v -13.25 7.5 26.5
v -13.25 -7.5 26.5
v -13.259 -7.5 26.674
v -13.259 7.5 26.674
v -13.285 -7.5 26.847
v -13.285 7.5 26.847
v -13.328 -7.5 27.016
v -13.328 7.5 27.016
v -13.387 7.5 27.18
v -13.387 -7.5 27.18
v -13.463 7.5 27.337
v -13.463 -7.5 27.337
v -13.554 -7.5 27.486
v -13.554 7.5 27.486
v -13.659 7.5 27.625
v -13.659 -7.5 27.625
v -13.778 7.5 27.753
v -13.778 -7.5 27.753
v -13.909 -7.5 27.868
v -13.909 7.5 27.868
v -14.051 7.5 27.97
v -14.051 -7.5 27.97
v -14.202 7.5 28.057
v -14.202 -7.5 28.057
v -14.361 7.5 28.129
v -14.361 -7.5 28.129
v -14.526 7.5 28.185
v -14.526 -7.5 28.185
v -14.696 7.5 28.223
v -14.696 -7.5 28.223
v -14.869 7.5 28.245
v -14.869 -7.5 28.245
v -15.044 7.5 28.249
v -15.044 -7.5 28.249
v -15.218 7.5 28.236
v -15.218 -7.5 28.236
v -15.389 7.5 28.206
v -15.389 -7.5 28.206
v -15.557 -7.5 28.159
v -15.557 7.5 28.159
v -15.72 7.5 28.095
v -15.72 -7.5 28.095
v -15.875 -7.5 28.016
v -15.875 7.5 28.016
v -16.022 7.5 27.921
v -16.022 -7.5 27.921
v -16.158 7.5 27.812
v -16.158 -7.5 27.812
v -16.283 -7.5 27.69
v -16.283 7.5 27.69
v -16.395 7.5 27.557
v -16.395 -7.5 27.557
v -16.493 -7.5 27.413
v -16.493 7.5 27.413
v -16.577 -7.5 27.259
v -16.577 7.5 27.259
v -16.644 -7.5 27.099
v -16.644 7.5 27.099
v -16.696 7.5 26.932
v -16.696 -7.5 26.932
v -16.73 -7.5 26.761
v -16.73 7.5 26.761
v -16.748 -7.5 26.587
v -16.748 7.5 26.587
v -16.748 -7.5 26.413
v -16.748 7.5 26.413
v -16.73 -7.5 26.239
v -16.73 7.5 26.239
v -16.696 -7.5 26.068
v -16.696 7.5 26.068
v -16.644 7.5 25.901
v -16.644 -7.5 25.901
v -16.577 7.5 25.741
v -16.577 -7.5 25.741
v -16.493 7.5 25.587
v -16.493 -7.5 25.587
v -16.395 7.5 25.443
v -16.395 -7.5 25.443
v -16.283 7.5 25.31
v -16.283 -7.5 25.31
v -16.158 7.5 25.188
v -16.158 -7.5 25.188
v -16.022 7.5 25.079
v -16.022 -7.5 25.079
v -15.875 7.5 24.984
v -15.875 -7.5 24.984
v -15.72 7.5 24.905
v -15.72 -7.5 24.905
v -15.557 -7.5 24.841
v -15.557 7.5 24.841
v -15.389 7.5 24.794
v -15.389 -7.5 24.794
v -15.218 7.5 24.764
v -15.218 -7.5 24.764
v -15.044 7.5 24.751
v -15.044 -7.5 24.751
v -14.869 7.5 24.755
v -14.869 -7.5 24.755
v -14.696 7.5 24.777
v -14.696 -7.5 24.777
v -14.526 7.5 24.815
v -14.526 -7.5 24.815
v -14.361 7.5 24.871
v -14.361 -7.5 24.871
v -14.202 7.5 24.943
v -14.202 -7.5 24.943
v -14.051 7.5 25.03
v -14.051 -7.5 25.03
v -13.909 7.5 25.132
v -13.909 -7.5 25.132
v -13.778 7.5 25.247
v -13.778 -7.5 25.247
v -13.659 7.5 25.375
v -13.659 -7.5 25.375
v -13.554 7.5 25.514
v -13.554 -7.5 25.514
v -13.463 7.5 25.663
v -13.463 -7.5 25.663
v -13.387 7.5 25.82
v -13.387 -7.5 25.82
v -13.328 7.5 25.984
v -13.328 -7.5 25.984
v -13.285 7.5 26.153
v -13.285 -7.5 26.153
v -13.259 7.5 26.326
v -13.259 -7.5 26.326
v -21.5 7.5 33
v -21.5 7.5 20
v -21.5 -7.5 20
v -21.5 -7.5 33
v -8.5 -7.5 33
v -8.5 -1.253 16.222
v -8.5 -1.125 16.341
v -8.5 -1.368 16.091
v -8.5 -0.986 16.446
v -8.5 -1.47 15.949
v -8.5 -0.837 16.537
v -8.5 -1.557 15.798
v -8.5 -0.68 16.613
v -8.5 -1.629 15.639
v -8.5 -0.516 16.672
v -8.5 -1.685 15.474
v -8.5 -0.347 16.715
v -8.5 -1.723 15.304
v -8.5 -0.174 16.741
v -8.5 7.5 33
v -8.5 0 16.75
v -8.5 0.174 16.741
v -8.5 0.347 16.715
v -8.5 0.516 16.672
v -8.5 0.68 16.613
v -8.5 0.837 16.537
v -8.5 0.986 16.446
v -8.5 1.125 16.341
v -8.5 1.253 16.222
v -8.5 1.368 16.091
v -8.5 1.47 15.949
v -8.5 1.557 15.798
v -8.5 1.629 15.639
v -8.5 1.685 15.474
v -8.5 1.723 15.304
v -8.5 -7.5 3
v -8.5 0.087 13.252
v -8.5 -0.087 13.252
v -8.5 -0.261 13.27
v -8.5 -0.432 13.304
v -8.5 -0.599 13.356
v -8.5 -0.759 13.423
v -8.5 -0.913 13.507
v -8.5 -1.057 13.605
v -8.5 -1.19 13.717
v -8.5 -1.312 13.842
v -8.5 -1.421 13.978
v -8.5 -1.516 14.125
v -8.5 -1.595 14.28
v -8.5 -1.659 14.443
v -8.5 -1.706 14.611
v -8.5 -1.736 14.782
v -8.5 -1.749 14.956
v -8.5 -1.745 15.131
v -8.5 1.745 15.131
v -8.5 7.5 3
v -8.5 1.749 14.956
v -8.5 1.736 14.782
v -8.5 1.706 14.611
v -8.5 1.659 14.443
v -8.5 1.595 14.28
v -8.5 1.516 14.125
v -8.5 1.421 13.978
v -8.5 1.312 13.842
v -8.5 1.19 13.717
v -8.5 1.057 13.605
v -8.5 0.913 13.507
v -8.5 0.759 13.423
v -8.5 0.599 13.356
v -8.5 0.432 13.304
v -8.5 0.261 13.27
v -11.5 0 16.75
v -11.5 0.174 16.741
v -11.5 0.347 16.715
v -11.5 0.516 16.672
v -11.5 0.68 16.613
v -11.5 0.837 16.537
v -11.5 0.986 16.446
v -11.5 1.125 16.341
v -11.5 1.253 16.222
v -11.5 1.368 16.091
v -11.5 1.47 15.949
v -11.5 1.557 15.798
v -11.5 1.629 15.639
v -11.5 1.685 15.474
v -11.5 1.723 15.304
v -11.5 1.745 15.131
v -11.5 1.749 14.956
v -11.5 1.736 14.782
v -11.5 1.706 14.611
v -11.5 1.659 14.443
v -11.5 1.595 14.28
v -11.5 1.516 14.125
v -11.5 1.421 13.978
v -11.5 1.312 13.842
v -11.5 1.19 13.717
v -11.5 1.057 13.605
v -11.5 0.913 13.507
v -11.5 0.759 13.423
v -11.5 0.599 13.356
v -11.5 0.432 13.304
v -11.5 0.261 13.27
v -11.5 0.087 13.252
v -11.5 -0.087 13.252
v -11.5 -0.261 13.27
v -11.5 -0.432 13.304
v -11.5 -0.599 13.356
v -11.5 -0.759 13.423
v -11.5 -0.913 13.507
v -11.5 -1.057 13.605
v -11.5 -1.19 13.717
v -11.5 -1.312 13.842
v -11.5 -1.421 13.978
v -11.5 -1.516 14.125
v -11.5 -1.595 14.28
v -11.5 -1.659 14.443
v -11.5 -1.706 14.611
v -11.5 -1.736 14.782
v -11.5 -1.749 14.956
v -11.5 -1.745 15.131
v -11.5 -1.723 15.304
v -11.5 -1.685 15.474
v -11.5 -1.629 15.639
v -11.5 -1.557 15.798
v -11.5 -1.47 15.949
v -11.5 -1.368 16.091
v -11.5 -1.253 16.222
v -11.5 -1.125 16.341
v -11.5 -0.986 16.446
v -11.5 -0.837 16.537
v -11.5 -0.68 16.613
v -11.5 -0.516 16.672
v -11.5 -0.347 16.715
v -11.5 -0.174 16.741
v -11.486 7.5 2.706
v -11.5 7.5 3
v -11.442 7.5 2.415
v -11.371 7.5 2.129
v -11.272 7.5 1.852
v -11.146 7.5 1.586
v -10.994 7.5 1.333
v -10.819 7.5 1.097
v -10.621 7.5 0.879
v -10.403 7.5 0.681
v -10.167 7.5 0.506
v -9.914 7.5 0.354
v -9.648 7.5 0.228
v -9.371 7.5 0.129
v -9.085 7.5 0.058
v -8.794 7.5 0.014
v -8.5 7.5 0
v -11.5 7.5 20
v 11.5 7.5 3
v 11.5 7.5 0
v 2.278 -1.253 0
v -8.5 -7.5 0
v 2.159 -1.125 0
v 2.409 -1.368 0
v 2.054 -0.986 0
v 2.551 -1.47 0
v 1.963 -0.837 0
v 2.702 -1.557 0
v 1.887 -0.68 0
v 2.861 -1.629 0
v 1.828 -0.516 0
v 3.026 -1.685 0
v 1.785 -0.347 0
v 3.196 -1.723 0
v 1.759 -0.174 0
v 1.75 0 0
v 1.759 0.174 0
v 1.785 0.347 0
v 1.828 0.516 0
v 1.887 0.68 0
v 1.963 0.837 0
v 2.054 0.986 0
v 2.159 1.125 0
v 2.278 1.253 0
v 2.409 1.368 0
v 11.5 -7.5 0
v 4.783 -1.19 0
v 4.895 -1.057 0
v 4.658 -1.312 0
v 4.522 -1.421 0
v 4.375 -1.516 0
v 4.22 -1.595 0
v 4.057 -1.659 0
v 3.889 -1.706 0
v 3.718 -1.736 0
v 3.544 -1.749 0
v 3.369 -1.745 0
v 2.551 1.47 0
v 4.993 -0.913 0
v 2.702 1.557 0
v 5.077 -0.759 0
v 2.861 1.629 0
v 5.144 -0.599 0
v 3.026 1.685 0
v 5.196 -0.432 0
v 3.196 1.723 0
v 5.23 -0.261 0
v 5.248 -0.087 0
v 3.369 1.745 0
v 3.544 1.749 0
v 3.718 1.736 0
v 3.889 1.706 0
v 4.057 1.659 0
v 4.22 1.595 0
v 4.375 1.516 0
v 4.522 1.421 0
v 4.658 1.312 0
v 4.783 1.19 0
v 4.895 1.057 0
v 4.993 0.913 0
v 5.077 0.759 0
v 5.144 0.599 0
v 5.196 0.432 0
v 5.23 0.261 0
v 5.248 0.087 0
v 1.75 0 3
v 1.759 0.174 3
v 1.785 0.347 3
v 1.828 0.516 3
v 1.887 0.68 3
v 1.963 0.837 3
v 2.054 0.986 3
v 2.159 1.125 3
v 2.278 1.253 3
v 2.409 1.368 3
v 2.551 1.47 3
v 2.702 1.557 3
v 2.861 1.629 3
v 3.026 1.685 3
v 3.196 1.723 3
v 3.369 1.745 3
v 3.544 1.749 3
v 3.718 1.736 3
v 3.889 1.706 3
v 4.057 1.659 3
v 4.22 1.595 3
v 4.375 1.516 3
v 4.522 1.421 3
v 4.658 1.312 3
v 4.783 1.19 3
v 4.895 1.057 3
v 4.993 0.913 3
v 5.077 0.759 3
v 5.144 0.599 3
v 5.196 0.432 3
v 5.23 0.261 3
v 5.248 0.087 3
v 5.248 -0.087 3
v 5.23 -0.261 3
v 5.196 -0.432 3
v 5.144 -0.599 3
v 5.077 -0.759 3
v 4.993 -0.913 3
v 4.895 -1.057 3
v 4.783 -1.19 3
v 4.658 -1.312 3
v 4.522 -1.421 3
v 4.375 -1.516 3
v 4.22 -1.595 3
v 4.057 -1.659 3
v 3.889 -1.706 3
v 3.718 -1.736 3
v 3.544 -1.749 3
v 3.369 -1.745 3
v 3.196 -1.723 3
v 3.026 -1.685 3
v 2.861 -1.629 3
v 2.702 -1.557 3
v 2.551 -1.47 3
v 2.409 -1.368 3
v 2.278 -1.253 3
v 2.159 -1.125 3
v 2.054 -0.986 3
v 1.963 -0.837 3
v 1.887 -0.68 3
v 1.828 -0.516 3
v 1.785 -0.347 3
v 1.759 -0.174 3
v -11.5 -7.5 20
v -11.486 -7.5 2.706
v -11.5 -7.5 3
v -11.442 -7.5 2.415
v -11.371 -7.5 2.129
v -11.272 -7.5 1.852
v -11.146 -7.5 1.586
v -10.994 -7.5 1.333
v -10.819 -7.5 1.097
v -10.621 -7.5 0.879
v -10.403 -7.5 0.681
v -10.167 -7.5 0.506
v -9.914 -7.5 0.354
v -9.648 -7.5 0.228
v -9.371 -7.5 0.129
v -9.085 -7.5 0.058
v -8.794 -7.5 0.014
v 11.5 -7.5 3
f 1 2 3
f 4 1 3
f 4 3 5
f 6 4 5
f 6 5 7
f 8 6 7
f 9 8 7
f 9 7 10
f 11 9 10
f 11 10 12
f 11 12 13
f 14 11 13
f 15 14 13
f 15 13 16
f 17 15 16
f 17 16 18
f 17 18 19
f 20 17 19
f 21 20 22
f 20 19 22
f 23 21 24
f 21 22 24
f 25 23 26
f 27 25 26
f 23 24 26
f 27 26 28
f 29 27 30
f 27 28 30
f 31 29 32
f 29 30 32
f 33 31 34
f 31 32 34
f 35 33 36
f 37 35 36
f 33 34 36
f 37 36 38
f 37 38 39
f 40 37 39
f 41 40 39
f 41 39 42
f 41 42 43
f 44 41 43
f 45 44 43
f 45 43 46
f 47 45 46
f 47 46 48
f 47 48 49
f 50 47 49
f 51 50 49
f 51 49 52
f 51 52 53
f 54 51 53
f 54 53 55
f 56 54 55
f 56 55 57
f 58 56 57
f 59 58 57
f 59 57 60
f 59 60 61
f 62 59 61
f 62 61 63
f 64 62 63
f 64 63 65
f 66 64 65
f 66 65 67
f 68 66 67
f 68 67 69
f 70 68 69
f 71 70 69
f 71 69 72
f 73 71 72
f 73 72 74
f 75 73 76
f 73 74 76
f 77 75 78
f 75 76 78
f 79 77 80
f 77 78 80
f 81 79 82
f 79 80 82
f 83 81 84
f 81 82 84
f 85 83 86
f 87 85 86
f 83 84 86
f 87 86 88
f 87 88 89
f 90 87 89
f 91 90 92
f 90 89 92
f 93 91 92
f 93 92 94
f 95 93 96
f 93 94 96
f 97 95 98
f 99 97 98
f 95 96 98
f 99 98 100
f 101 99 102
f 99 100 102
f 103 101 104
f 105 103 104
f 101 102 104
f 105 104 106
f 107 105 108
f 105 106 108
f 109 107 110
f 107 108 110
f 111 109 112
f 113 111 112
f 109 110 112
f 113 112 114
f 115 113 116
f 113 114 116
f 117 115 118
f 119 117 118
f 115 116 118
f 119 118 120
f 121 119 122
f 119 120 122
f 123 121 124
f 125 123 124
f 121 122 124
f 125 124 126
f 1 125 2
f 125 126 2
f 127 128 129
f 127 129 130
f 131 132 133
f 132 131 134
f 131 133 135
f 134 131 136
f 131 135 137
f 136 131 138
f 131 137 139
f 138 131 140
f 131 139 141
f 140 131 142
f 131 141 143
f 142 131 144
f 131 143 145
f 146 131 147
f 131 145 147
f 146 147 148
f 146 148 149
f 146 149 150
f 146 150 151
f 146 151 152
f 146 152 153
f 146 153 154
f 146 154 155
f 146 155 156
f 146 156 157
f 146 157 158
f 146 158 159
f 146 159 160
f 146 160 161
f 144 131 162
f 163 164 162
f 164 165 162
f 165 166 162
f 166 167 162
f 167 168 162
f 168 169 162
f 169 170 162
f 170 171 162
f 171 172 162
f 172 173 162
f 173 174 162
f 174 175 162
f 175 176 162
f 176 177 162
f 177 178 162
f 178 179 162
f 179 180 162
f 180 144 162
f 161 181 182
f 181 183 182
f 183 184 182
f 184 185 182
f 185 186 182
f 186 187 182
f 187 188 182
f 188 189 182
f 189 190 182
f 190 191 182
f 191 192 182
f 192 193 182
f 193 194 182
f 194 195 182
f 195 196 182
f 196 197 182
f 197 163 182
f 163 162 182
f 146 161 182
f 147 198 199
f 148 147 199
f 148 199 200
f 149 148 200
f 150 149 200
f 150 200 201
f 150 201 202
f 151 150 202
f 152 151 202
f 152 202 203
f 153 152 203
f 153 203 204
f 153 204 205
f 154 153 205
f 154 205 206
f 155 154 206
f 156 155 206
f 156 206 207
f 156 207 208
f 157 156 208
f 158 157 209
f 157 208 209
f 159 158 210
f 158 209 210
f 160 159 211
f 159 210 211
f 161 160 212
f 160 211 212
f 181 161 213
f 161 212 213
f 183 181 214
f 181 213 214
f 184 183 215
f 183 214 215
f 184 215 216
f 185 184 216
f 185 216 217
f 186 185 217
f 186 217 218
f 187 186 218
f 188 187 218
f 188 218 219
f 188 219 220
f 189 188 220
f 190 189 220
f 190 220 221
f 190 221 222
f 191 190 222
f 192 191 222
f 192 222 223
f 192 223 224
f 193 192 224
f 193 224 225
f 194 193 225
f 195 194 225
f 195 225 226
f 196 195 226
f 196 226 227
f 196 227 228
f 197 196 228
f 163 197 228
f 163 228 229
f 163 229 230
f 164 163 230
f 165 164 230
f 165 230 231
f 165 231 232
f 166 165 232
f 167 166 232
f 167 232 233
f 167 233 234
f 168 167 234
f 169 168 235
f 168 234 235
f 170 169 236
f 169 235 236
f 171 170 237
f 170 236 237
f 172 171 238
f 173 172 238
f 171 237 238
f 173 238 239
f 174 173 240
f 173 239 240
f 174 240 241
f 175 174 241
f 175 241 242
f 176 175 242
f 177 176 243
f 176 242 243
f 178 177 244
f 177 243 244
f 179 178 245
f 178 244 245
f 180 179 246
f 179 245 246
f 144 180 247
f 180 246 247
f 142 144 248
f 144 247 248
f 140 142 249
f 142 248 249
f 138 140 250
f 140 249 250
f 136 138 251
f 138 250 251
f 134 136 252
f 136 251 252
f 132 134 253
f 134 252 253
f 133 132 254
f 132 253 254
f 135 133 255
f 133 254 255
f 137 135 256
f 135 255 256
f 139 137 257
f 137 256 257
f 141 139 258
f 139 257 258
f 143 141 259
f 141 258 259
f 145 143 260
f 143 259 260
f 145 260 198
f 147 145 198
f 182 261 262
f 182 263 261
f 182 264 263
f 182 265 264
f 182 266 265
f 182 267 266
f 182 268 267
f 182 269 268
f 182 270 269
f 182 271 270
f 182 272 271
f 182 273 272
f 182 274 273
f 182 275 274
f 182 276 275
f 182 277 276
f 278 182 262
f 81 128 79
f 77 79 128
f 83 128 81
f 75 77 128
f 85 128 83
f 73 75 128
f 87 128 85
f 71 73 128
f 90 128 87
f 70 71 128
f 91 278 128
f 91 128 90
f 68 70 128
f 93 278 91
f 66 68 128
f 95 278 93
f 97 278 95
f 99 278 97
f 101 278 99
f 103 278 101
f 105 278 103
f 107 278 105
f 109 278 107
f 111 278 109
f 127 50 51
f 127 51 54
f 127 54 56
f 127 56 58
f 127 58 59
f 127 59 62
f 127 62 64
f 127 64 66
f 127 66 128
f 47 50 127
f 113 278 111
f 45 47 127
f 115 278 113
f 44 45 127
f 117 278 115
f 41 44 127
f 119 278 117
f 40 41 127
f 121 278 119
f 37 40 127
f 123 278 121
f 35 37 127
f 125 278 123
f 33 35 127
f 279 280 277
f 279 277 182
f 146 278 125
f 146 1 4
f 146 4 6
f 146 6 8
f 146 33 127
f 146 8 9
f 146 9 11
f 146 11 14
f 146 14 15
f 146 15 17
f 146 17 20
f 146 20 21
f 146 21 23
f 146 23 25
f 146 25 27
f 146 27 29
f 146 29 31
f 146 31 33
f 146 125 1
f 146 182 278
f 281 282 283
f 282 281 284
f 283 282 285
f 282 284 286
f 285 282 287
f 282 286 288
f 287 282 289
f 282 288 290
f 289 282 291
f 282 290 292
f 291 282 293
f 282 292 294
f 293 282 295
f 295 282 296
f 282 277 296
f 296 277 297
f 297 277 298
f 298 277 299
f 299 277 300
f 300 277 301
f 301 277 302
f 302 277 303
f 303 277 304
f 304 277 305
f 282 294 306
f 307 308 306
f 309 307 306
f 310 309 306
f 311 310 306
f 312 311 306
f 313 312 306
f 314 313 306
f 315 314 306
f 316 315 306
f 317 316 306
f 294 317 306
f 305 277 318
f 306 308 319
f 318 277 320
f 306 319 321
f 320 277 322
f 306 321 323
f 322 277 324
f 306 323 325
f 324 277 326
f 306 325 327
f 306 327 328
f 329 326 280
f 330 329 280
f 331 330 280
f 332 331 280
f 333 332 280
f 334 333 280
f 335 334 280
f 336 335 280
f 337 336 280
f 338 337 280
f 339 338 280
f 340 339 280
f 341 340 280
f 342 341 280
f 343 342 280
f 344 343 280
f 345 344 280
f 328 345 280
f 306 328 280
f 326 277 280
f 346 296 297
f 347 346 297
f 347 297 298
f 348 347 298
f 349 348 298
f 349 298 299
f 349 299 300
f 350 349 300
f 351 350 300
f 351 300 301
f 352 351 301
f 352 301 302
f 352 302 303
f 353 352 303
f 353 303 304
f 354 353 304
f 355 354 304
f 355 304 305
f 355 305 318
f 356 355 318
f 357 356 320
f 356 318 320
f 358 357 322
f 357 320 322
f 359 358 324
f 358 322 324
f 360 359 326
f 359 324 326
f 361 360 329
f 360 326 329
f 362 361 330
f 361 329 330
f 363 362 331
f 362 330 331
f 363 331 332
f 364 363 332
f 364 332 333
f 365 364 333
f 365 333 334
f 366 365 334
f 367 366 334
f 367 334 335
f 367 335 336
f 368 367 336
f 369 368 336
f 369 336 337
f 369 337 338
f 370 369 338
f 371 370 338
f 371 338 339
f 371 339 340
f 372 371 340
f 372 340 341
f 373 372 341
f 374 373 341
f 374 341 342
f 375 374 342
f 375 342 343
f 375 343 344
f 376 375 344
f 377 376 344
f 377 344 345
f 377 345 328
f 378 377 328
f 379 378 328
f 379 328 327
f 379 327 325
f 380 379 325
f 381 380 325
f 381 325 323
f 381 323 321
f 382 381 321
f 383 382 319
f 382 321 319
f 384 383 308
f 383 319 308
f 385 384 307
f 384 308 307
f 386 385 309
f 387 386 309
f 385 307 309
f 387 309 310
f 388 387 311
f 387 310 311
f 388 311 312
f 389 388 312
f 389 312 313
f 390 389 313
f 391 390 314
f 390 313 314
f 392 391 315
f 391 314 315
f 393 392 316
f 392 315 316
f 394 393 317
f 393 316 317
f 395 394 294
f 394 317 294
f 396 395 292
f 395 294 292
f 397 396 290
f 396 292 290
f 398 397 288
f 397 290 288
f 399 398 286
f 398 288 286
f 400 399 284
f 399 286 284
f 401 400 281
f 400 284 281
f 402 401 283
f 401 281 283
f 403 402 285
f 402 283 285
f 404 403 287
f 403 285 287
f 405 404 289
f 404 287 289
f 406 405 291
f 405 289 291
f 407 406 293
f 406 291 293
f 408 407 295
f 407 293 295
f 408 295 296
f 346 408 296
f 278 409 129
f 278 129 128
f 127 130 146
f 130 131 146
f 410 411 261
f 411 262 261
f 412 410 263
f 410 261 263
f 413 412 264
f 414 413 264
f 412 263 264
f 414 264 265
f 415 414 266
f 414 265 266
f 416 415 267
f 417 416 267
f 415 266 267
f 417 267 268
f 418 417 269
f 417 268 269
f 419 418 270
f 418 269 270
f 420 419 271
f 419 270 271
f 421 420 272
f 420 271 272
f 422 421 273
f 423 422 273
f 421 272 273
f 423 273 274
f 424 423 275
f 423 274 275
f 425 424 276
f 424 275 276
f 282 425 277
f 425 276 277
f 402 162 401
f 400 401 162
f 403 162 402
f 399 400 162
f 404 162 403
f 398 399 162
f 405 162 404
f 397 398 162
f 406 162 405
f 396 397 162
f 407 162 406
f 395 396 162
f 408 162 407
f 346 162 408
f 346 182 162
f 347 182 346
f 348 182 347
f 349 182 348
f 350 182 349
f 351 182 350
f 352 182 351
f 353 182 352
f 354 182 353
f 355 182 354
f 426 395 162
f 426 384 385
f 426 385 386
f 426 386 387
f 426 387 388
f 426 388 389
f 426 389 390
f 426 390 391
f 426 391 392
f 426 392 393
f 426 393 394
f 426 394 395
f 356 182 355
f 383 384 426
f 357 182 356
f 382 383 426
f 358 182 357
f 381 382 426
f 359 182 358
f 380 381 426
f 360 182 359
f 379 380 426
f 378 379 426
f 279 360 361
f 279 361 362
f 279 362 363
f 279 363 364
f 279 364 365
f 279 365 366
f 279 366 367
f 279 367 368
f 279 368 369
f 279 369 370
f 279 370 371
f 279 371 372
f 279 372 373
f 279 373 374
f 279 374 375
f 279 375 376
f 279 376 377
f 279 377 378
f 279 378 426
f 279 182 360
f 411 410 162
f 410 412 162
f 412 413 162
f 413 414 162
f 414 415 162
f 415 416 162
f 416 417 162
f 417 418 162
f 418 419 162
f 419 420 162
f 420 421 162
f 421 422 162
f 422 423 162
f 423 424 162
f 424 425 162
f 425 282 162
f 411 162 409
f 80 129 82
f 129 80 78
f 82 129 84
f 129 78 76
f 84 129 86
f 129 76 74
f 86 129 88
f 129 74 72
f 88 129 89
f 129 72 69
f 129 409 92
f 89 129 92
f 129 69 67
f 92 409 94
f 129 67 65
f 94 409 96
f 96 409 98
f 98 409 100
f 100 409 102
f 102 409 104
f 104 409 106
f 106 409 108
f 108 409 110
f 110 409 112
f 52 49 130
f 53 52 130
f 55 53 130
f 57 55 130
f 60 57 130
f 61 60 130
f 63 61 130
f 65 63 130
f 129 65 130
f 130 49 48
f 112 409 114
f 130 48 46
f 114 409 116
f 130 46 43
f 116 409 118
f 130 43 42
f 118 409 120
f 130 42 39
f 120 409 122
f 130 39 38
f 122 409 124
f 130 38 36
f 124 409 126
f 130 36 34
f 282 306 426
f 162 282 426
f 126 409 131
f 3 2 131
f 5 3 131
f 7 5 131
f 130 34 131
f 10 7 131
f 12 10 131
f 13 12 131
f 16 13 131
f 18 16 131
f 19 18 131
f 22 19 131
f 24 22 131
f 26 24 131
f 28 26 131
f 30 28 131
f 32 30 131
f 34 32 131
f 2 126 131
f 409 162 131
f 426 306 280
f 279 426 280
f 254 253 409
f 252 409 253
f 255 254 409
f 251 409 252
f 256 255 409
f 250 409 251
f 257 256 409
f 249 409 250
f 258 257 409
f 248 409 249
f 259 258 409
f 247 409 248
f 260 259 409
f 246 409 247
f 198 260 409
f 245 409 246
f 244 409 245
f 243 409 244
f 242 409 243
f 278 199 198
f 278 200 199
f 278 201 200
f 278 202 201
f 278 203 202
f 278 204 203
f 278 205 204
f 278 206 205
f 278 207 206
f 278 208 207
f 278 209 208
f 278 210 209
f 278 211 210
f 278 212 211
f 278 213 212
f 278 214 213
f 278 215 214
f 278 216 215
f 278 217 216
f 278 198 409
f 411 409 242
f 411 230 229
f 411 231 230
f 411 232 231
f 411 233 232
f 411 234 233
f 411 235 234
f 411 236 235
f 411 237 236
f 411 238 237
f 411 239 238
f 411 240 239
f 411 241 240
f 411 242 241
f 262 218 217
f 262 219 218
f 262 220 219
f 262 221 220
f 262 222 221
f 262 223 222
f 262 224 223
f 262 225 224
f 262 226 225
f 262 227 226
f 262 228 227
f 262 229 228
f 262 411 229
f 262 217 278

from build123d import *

# Parameters (mm, degrees)
SKETCH1_W           = 23
SKETCH1_H           = 15
BOSS_EXTRUDE1_DEPTH = 3
SKETCH10_W          = 3
SKETCH10_H          = 15
BOSS_EXTRUDE2_DEPTH = 20
SKETCH13_R          = 1.75
CUT_EXTRUDE3_DEPTH  = 24
SKETCH14_R          = 1.75
CUT_EXTRUDE4_DEPTH  = 24
FILLET1_R           = 3
SKETCH15_W          = 3
SKETCH15_H          = 15
BOSS_EXTRUDE3_DEPTH = 10
SKETCH16_W          = 13
SKETCH16_H          = 15
BOSS_EXTRUDE4_DEPTH = 10
SKETCH17_R          = 1.75
CUT_EXTRUDE5_DEPTH  = 16


with BuildPart() as part:
    # Sketch1 → Boss-Extrude1 (new body)
    with BuildSketch(Plane.XY):
        Rectangle(SKETCH1_W, SKETCH1_H)
    extrude(amount=BOSS_EXTRUDE1_DEPTH)

    # Sketch10 → Boss-Extrude2 (add)
    with BuildSketch(Plane.XY.offset(3)):
        with Locations((-10, 0)):
            Rectangle(SKETCH10_W, SKETCH10_H)
    extrude(amount=BOSS_EXTRUDE2_DEPTH)

    # Sketch13 → Cut-Extrude3 (cut, through all)
    with BuildSketch(Plane(origin=(0, 0, 0), x_dir=(-1, 0, 0), z_dir=(0, 0, -1))):
        with Locations((-3.5, 0)):
            Circle(SKETCH13_R)
    extrude(amount=-CUT_EXTRUDE3_DEPTH, mode=Mode.SUBTRACT)

    # Sketch14 → Cut-Extrude4 (cut, through all)
    with BuildSketch(Plane.ZY.offset(11.5)):
        with Locations((15, 0)):
            Circle(SKETCH14_R)
    extrude(amount=-CUT_EXTRUDE4_DEPTH, mode=Mode.SUBTRACT)

    # Fillet1
    fillet1_edges = [part.edges().sort_by_distance(p)[0] for p in [
        (-11.5, 0, 0),
    ]]
    fillet(fillet1_edges, radius=FILLET1_R)

    # Sketch15 → Boss-Extrude3 (add)
    with BuildSketch(Plane.XY.offset(23)):
        with Locations((-10, 0)):
            Rectangle(SKETCH15_W, SKETCH15_H)
    extrude(amount=BOSS_EXTRUDE3_DEPTH)

    # Sketch16 → Boss-Extrude4 (add)
    with BuildSketch(Plane.ZY.offset(11.5)):
        with Locations((26.5, 0)):
            Rectangle(SKETCH16_W, SKETCH16_H)
    extrude(amount=BOSS_EXTRUDE4_DEPTH)

    # Sketch17 → Cut-Extrude5 (cut, through all)
    with BuildSketch(Plane.XZ.offset(7.5)):
        with Locations((-15, 26.5)):
            Circle(SKETCH17_R)
    extrude(amount=-CUT_EXTRUDE5_DEPTH, mode=Mode.SUBTRACT)


solid = part.part
